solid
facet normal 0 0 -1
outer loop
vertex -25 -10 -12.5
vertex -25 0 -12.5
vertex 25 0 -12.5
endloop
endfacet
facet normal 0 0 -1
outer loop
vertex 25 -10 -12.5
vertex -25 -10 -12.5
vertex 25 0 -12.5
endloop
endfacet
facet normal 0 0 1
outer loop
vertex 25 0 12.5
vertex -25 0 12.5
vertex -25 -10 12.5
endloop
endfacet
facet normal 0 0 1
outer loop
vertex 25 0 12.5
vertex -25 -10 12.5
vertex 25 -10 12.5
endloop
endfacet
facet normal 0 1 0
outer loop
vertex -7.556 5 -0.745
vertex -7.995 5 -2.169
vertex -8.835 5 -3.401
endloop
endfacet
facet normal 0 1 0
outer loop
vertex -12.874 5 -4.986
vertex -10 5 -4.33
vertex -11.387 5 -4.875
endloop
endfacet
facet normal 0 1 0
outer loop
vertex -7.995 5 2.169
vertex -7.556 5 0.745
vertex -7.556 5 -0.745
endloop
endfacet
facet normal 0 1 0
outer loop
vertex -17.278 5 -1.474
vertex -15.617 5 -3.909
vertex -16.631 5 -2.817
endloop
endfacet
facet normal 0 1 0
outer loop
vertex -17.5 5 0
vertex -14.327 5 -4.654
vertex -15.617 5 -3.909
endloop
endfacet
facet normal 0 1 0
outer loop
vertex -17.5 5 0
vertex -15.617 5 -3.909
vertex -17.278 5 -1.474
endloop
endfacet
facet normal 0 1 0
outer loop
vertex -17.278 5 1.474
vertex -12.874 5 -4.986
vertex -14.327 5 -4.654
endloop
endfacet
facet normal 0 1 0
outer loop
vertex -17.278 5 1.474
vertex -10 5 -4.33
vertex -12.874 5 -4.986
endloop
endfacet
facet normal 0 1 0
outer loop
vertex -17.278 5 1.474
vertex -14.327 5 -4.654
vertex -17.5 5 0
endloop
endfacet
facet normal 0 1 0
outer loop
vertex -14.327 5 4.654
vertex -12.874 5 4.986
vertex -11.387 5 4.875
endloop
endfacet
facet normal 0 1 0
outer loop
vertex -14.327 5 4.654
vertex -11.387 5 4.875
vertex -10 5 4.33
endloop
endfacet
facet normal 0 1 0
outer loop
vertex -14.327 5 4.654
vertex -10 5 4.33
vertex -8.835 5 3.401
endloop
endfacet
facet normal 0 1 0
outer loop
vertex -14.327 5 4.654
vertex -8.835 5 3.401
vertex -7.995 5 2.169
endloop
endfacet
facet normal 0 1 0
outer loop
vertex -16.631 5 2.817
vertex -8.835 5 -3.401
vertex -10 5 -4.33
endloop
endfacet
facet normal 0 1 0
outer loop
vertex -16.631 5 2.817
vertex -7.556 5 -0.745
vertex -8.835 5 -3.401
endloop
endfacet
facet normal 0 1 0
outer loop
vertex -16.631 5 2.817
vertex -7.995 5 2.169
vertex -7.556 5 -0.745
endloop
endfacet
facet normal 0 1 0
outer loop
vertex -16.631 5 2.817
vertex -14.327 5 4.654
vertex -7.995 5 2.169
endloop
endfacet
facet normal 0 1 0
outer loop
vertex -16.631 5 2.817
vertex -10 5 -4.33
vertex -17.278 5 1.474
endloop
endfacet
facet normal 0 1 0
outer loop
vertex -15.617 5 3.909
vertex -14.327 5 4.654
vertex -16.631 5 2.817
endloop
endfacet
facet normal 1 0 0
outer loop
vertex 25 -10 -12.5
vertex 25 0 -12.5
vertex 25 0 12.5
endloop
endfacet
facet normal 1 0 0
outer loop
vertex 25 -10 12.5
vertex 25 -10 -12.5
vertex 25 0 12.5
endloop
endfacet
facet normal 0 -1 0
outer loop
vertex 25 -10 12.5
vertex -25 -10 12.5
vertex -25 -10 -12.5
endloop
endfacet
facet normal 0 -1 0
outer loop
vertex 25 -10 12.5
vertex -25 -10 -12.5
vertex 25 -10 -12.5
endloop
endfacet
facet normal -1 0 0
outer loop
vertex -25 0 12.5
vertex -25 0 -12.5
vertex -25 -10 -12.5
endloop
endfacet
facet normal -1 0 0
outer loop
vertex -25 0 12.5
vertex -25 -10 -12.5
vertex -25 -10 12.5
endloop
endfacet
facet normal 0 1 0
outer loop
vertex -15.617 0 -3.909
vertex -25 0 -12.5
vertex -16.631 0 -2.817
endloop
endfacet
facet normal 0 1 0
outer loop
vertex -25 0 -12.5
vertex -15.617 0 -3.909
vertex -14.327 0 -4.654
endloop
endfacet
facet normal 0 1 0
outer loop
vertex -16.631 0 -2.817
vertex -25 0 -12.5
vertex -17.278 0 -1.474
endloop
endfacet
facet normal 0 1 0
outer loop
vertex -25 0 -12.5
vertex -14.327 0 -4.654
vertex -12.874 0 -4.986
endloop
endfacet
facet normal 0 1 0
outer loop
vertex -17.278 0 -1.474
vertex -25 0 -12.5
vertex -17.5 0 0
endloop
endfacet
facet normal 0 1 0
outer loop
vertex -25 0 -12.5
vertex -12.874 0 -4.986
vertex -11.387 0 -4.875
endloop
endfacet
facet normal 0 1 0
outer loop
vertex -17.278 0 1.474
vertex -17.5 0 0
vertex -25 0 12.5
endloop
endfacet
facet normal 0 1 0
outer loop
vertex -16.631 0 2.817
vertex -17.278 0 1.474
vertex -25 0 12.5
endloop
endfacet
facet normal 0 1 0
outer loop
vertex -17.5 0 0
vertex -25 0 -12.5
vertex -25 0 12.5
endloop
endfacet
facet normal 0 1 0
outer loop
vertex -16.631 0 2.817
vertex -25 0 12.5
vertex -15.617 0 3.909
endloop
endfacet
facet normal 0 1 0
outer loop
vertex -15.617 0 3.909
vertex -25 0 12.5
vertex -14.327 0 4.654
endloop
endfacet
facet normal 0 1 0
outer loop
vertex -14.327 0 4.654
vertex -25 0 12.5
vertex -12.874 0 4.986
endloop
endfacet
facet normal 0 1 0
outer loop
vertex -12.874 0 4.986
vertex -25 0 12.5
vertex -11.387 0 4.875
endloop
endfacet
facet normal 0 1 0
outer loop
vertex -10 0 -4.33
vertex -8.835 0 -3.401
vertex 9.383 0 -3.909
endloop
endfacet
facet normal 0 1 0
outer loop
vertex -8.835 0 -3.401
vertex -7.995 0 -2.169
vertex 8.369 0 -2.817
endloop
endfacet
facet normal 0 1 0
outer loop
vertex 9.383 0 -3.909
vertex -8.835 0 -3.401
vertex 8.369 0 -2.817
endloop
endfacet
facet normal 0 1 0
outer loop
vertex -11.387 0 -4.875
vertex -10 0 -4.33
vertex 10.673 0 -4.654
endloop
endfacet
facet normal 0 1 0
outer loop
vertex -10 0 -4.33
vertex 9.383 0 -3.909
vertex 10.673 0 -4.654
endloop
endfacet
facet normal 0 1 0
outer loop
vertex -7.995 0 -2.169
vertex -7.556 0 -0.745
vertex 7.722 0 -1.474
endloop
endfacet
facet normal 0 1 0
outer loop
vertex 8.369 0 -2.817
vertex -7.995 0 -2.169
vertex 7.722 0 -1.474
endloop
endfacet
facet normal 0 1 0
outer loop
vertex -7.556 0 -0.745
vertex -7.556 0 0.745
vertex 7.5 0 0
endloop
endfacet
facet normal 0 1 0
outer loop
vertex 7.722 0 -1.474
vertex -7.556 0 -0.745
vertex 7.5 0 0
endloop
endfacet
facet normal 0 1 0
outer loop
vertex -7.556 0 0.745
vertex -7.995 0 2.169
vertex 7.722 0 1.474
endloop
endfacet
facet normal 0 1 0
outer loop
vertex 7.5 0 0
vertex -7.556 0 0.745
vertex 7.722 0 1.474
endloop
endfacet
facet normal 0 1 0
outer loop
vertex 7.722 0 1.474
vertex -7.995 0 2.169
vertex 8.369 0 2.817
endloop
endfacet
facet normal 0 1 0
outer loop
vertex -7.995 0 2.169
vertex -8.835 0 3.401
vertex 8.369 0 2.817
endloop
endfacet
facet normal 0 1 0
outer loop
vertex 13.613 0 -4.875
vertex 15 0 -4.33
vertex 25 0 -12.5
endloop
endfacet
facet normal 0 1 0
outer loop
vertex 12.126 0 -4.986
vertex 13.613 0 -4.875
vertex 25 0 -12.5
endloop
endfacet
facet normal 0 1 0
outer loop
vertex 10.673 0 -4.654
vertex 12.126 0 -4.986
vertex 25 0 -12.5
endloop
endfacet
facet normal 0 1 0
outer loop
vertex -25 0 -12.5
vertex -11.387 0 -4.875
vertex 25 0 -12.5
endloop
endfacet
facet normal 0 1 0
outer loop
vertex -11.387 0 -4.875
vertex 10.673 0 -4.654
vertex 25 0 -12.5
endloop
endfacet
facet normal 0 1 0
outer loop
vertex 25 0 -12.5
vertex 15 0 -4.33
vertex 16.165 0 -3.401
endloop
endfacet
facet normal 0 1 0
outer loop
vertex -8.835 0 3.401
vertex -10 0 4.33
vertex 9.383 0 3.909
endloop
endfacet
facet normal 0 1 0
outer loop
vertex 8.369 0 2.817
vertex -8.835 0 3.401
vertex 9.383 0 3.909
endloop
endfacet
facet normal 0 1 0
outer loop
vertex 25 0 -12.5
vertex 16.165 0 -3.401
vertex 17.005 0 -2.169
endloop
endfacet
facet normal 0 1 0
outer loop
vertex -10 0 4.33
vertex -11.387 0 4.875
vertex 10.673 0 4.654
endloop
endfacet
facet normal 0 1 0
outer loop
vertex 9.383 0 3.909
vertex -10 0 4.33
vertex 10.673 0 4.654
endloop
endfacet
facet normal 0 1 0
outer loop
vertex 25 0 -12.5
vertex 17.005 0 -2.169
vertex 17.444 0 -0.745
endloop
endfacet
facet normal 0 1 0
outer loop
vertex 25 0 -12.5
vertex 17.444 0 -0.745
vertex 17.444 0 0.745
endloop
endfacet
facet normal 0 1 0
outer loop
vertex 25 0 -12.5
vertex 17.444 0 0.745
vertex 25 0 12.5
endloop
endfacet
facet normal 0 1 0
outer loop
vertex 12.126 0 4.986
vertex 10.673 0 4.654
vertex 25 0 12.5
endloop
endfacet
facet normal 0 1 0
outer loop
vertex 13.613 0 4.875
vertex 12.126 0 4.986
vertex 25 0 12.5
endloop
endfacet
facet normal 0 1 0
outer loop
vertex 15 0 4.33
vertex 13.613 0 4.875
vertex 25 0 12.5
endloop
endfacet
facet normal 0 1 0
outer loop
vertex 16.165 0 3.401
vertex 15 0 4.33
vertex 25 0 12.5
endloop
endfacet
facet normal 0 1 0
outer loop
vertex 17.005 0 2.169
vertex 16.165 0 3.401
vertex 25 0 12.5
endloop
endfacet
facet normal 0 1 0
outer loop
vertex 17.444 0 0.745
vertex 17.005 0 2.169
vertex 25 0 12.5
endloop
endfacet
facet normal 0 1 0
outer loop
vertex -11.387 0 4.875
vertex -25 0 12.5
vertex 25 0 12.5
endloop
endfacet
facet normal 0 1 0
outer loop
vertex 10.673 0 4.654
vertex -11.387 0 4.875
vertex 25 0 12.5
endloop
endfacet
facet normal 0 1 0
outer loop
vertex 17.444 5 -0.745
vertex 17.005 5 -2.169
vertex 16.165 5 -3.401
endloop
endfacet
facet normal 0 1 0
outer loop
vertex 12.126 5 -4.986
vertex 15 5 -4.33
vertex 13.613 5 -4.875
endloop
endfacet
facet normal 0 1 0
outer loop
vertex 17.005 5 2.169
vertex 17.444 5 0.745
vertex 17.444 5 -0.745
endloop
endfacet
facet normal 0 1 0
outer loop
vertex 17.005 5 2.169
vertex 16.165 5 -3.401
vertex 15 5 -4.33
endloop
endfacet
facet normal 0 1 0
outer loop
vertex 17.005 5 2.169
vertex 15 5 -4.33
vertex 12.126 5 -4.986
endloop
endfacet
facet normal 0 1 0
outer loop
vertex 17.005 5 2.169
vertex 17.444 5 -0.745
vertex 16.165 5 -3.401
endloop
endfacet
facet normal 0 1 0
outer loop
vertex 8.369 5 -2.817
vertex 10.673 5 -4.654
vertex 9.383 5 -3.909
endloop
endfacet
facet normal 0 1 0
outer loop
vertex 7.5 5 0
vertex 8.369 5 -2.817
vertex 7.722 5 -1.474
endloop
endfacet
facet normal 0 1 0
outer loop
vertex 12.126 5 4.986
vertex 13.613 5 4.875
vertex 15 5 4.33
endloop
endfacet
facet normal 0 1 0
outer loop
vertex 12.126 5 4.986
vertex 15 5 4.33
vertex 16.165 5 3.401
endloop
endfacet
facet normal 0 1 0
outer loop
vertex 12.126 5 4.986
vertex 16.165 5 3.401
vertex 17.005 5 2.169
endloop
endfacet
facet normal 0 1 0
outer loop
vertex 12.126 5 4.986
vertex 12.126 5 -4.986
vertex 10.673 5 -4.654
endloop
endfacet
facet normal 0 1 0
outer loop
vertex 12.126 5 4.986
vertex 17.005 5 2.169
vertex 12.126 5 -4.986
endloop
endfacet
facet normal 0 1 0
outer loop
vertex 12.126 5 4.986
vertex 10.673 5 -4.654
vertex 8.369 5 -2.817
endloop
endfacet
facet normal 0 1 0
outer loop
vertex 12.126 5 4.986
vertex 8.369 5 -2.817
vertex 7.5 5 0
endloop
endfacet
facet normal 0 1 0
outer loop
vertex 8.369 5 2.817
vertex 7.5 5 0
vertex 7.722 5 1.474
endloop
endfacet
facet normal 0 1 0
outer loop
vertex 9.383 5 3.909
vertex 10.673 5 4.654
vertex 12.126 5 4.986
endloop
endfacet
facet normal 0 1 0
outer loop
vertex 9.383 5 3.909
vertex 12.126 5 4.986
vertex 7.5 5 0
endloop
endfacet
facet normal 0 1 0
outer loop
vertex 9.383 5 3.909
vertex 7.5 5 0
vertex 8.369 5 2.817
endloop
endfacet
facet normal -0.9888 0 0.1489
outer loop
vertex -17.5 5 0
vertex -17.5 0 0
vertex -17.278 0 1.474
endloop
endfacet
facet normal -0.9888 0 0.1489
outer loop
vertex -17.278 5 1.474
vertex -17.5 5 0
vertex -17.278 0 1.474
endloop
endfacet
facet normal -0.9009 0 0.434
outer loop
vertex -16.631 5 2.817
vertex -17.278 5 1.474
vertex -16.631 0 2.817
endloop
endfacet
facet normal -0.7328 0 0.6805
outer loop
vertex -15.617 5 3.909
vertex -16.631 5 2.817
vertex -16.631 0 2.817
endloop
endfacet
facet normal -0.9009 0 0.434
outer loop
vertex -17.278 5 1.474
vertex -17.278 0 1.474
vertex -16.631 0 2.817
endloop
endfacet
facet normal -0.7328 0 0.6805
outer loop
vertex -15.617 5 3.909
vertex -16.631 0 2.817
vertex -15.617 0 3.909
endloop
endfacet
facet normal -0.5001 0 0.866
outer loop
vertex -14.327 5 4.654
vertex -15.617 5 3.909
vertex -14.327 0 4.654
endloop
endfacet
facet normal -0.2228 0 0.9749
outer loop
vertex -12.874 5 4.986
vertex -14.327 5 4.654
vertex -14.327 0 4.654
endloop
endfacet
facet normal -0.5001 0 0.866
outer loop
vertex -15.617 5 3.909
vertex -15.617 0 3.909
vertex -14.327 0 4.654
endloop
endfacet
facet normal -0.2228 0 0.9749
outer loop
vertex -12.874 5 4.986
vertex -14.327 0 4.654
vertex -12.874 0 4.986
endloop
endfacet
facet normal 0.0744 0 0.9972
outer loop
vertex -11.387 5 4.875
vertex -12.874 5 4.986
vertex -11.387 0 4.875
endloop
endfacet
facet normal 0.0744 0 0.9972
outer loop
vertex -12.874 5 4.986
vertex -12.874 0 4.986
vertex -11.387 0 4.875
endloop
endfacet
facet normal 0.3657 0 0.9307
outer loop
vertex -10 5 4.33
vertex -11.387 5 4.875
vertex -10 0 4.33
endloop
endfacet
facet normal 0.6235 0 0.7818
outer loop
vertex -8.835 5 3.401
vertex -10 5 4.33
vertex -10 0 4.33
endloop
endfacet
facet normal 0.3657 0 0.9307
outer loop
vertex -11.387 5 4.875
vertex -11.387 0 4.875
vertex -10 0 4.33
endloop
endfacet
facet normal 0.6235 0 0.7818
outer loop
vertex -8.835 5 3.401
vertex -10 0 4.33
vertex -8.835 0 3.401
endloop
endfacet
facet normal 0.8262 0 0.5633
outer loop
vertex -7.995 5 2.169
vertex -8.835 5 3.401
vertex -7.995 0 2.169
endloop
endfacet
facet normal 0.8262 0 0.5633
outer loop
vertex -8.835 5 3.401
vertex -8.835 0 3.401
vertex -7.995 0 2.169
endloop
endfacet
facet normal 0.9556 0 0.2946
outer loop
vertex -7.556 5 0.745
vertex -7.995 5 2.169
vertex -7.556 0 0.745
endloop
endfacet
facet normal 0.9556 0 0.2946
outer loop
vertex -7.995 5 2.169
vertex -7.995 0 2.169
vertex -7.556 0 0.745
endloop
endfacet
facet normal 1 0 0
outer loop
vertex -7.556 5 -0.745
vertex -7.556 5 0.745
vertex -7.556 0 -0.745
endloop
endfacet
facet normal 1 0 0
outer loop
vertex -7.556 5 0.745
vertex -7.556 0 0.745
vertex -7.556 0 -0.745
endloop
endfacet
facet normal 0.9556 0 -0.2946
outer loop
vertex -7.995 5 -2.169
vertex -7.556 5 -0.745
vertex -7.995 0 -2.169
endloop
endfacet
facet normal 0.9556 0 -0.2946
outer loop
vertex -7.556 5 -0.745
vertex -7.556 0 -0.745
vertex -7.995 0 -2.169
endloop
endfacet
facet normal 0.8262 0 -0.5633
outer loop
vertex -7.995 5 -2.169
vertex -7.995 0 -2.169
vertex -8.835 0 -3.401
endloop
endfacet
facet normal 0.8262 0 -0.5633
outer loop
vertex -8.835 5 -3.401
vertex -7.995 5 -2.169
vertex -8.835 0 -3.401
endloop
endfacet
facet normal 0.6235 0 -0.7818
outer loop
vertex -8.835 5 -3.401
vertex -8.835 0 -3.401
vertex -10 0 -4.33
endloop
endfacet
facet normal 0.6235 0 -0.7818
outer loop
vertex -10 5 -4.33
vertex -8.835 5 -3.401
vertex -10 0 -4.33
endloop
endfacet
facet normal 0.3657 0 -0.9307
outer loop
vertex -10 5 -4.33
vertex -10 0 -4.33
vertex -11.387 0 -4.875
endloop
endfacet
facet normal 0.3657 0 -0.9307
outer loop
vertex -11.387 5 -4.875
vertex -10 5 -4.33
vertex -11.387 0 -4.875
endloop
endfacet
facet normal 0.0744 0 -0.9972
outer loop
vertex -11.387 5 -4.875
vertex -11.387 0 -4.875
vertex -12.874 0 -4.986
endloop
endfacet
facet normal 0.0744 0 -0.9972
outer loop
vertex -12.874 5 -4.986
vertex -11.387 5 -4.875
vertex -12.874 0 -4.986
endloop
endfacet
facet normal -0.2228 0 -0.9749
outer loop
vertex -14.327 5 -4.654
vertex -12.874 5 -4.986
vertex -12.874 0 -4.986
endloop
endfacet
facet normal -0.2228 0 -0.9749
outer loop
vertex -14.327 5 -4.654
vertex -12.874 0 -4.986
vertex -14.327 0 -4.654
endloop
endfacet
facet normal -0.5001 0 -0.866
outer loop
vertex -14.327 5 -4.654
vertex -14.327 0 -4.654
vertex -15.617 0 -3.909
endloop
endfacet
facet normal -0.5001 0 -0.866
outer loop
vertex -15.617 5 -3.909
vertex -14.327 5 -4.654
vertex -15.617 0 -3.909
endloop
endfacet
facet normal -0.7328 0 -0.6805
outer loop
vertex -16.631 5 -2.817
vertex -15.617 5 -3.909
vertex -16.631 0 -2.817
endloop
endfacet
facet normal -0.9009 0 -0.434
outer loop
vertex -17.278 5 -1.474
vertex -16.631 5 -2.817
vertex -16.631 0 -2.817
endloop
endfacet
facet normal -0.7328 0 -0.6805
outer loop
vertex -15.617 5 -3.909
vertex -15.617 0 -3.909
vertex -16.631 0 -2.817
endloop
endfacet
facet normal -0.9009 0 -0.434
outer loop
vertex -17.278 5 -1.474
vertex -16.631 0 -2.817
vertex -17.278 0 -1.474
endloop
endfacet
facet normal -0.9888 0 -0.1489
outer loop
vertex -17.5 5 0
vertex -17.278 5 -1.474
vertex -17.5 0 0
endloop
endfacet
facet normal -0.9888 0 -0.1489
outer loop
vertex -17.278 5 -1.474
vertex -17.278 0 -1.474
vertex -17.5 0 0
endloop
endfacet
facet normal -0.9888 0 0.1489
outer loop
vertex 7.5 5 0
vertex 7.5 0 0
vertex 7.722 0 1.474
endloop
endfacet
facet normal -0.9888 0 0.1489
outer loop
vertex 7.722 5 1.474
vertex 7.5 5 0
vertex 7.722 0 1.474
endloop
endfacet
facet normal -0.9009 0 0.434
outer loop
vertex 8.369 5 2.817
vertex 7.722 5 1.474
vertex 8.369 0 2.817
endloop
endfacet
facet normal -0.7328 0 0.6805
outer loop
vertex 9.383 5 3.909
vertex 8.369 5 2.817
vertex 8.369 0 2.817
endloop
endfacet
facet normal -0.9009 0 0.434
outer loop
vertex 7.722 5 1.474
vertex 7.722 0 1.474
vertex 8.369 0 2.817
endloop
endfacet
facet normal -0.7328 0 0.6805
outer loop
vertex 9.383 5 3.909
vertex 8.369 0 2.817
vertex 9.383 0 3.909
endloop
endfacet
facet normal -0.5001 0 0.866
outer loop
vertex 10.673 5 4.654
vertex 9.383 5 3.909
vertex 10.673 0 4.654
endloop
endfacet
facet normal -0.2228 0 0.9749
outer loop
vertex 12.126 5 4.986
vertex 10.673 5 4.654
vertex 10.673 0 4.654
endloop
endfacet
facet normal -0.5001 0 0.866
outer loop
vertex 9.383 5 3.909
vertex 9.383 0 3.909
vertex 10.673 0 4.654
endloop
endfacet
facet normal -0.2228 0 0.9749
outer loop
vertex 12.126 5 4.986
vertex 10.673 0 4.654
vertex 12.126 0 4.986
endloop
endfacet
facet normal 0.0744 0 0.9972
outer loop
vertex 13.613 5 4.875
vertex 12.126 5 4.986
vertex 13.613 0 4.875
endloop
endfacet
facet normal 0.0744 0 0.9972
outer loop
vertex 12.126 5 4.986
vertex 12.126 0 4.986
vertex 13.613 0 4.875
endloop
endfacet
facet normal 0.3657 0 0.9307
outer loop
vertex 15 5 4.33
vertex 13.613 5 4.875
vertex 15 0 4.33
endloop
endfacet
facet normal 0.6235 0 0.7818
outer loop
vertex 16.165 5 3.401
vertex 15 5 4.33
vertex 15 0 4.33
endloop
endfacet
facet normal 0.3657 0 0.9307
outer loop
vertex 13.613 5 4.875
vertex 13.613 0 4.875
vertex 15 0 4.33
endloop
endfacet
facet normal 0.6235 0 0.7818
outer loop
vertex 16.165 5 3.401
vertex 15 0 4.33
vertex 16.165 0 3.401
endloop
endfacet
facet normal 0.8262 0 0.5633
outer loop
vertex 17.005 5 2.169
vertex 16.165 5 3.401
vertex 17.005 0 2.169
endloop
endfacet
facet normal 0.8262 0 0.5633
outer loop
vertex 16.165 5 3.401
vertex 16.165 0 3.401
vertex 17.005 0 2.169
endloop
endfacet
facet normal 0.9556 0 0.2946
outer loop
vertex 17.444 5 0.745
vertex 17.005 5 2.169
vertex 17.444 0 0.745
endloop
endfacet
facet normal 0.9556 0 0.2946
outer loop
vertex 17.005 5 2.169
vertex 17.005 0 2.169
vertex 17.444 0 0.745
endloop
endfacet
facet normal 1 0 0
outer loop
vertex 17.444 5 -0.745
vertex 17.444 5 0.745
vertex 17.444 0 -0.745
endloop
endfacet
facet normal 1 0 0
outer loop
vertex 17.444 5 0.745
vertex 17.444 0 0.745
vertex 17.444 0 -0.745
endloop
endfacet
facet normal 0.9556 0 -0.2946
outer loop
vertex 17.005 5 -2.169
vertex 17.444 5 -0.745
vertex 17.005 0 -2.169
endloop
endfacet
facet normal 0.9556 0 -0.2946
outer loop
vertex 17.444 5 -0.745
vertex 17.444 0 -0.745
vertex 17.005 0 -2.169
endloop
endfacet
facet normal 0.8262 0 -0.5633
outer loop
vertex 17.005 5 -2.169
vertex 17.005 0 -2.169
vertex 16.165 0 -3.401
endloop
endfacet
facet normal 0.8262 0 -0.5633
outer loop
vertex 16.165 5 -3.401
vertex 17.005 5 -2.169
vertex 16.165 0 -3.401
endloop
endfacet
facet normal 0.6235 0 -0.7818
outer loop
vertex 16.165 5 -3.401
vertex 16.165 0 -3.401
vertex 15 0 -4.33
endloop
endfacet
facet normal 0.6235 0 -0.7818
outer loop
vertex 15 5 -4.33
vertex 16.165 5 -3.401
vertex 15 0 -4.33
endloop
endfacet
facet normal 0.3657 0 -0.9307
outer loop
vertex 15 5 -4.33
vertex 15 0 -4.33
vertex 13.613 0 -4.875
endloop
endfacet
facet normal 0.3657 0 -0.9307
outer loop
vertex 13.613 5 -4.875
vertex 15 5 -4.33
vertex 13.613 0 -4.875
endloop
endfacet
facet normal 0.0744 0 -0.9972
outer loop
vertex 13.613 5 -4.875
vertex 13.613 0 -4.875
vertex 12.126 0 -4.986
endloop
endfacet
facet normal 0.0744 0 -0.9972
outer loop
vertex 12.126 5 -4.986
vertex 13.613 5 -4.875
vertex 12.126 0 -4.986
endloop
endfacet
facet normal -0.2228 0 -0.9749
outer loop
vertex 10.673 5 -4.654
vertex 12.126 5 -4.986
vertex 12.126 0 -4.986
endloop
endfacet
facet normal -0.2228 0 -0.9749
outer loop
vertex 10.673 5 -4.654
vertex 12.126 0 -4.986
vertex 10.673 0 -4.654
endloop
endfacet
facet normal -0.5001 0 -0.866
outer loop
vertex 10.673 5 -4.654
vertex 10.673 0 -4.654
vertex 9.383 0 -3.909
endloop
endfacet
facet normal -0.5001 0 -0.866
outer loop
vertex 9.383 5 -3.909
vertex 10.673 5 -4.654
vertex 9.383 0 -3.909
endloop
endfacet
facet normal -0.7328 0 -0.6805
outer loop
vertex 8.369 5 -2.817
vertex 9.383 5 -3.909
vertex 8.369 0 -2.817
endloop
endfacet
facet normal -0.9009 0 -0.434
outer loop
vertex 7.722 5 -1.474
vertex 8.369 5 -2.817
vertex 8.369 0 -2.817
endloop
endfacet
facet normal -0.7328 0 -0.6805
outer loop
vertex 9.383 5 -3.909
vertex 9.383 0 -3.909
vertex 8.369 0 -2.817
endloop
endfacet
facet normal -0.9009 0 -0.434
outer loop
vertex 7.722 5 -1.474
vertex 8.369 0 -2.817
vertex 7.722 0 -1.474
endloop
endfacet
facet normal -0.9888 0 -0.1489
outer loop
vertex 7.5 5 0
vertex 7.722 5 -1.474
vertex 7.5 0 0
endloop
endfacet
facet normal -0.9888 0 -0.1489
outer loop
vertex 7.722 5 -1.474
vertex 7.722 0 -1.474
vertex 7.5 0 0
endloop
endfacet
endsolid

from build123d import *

# Parameters (mm, degrees)
F0_W     = 50
F0_H     = 25
F1_DEPTH = 10
F2_R     = 5
F3_DEPTH = 5


with BuildPart() as f1:
    # F0 (on Front) → F1 (new body)
    with BuildSketch(Plane.XZ):
        Rectangle(F0_W, F0_H)
    extrude(amount=F1_DEPTH)

    # F2 (on face) → F3 (join)
    with BuildSketch(Plane(origin=(0, 0, 0), x_dir=(-1, 0, 0), z_dir=(0, 1, 0))):
        with Locations((-12.5, 0)):
            Circle(F2_R)
        with Locations((12.5, 0)):
            Circle(F2_R)
    extrude(amount=F3_DEPTH)


solid = f1.part
